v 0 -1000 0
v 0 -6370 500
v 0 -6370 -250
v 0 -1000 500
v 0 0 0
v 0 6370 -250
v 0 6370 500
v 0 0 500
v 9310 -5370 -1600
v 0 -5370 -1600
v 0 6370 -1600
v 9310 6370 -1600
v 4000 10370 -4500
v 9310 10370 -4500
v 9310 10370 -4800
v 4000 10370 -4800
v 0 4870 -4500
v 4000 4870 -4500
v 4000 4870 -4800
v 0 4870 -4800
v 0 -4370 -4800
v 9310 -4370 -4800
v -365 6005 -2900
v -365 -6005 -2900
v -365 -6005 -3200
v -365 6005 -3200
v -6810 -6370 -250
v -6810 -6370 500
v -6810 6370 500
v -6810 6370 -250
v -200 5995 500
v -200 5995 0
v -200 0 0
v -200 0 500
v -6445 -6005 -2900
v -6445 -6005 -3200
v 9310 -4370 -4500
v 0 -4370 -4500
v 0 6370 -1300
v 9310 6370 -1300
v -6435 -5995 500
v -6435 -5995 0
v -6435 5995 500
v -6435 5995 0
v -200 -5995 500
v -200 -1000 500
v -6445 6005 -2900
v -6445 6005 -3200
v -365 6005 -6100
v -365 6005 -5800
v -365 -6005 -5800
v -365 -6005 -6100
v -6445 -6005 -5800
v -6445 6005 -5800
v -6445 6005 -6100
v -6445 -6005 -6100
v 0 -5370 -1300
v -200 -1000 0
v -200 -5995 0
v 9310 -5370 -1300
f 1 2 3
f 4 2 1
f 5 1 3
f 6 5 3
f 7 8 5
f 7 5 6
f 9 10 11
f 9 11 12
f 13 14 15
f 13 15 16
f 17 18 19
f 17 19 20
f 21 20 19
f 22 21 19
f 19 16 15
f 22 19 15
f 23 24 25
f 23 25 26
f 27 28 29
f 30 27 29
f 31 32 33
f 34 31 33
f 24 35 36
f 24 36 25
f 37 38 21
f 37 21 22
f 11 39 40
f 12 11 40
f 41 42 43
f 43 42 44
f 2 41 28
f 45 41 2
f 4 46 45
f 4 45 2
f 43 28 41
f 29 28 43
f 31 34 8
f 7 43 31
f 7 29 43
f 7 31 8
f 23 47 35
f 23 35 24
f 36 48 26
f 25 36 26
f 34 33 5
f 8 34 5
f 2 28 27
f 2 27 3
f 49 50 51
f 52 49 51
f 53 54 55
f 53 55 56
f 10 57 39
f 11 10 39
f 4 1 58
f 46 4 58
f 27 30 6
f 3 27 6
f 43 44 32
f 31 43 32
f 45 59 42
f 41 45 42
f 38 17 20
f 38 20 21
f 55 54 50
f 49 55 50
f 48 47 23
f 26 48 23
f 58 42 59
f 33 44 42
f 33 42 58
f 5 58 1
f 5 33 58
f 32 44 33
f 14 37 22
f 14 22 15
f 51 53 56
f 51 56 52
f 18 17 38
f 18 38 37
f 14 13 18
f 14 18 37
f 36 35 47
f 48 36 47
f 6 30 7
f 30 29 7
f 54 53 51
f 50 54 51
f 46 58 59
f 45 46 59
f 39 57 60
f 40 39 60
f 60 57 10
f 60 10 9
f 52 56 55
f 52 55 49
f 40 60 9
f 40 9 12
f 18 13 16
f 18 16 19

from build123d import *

# Parameters (mm, degrees)
F1_DEPTH  = 500
F2_W      = 6810
F2_H      = 12740
F3_DEPTH  = 250
F6_W      = 6080
F6_H      = 12010
F7_DEPTH  = 300
F9_W      = 6080
F9_H      = 12010
F10_DEPTH = 300
F13_DEPTH = 300
F15_W     = 9310
F15_H     = 11740
F16_DEPTH = 300


# Not quite as in the source:
# - a feature names something its author has since deleted; it is built from what else it names


with BuildPart() as f1:
    # F0 (on Top) → F1 (new body)
    with BuildSketch(Plane.XY):
        Polygon((0, 0), (0, 6370), (-6810, 6370), (-6810, -6370), (0, -6370), (0, -1000), (-200, -1000), (-200, -5995), (-6435, -5995), (-6435, 5995), (-200, 5995), (-200, 0), align=None)
    extrude(amount=F1_DEPTH)

    # F2 (on Top) → F3 (join)
    with BuildSketch(Plane.XY):
        with Locations((-3405, 0)):
            Rectangle(F2_W, F2_H)
    extrude(amount=-F3_DEPTH)


with BuildPart() as f7:
    # F6 (on offset) → F7 (new body)
    with BuildSketch(Plane.XY.offset(-2900)):
        with Locations((-3405, 0)):
            Rectangle(F6_W, F6_H)
    extrude(amount=-F7_DEPTH)


with BuildPart() as f10:
    # F9 (on offset) → F10 (new body)
    with BuildSketch(Plane(origin=(0, 0, -5800), x_dir=(1, 0, 0), z_dir=(0, 0, -1))):
        with Locations((-3405, 0)):
            Rectangle(F9_W, F9_H)
    extrude(amount=F10_DEPTH)


with BuildPart() as f13:
    # F12 (on offset) → F13 (new body)
    with BuildSketch(Plane.XY.offset(-4500)):
        Polygon((4000, 4870), (0, 4870), (0, -4370), (9310, -4370), (9310, 10370), (4000, 10370), align=None)
    extrude(amount=-F13_DEPTH)


with BuildPart() as f16:
    # F15 (on offset) → F16 (new body)
    with BuildSketch(Plane.XY.offset(-1300)):
        with Locations((4655, 500)):
            Rectangle(F15_W, F15_H)
    extrude(amount=-F16_DEPTH)


solid = Compound([f1.part, f7.part, f10.part, f13.part, f16.part])
